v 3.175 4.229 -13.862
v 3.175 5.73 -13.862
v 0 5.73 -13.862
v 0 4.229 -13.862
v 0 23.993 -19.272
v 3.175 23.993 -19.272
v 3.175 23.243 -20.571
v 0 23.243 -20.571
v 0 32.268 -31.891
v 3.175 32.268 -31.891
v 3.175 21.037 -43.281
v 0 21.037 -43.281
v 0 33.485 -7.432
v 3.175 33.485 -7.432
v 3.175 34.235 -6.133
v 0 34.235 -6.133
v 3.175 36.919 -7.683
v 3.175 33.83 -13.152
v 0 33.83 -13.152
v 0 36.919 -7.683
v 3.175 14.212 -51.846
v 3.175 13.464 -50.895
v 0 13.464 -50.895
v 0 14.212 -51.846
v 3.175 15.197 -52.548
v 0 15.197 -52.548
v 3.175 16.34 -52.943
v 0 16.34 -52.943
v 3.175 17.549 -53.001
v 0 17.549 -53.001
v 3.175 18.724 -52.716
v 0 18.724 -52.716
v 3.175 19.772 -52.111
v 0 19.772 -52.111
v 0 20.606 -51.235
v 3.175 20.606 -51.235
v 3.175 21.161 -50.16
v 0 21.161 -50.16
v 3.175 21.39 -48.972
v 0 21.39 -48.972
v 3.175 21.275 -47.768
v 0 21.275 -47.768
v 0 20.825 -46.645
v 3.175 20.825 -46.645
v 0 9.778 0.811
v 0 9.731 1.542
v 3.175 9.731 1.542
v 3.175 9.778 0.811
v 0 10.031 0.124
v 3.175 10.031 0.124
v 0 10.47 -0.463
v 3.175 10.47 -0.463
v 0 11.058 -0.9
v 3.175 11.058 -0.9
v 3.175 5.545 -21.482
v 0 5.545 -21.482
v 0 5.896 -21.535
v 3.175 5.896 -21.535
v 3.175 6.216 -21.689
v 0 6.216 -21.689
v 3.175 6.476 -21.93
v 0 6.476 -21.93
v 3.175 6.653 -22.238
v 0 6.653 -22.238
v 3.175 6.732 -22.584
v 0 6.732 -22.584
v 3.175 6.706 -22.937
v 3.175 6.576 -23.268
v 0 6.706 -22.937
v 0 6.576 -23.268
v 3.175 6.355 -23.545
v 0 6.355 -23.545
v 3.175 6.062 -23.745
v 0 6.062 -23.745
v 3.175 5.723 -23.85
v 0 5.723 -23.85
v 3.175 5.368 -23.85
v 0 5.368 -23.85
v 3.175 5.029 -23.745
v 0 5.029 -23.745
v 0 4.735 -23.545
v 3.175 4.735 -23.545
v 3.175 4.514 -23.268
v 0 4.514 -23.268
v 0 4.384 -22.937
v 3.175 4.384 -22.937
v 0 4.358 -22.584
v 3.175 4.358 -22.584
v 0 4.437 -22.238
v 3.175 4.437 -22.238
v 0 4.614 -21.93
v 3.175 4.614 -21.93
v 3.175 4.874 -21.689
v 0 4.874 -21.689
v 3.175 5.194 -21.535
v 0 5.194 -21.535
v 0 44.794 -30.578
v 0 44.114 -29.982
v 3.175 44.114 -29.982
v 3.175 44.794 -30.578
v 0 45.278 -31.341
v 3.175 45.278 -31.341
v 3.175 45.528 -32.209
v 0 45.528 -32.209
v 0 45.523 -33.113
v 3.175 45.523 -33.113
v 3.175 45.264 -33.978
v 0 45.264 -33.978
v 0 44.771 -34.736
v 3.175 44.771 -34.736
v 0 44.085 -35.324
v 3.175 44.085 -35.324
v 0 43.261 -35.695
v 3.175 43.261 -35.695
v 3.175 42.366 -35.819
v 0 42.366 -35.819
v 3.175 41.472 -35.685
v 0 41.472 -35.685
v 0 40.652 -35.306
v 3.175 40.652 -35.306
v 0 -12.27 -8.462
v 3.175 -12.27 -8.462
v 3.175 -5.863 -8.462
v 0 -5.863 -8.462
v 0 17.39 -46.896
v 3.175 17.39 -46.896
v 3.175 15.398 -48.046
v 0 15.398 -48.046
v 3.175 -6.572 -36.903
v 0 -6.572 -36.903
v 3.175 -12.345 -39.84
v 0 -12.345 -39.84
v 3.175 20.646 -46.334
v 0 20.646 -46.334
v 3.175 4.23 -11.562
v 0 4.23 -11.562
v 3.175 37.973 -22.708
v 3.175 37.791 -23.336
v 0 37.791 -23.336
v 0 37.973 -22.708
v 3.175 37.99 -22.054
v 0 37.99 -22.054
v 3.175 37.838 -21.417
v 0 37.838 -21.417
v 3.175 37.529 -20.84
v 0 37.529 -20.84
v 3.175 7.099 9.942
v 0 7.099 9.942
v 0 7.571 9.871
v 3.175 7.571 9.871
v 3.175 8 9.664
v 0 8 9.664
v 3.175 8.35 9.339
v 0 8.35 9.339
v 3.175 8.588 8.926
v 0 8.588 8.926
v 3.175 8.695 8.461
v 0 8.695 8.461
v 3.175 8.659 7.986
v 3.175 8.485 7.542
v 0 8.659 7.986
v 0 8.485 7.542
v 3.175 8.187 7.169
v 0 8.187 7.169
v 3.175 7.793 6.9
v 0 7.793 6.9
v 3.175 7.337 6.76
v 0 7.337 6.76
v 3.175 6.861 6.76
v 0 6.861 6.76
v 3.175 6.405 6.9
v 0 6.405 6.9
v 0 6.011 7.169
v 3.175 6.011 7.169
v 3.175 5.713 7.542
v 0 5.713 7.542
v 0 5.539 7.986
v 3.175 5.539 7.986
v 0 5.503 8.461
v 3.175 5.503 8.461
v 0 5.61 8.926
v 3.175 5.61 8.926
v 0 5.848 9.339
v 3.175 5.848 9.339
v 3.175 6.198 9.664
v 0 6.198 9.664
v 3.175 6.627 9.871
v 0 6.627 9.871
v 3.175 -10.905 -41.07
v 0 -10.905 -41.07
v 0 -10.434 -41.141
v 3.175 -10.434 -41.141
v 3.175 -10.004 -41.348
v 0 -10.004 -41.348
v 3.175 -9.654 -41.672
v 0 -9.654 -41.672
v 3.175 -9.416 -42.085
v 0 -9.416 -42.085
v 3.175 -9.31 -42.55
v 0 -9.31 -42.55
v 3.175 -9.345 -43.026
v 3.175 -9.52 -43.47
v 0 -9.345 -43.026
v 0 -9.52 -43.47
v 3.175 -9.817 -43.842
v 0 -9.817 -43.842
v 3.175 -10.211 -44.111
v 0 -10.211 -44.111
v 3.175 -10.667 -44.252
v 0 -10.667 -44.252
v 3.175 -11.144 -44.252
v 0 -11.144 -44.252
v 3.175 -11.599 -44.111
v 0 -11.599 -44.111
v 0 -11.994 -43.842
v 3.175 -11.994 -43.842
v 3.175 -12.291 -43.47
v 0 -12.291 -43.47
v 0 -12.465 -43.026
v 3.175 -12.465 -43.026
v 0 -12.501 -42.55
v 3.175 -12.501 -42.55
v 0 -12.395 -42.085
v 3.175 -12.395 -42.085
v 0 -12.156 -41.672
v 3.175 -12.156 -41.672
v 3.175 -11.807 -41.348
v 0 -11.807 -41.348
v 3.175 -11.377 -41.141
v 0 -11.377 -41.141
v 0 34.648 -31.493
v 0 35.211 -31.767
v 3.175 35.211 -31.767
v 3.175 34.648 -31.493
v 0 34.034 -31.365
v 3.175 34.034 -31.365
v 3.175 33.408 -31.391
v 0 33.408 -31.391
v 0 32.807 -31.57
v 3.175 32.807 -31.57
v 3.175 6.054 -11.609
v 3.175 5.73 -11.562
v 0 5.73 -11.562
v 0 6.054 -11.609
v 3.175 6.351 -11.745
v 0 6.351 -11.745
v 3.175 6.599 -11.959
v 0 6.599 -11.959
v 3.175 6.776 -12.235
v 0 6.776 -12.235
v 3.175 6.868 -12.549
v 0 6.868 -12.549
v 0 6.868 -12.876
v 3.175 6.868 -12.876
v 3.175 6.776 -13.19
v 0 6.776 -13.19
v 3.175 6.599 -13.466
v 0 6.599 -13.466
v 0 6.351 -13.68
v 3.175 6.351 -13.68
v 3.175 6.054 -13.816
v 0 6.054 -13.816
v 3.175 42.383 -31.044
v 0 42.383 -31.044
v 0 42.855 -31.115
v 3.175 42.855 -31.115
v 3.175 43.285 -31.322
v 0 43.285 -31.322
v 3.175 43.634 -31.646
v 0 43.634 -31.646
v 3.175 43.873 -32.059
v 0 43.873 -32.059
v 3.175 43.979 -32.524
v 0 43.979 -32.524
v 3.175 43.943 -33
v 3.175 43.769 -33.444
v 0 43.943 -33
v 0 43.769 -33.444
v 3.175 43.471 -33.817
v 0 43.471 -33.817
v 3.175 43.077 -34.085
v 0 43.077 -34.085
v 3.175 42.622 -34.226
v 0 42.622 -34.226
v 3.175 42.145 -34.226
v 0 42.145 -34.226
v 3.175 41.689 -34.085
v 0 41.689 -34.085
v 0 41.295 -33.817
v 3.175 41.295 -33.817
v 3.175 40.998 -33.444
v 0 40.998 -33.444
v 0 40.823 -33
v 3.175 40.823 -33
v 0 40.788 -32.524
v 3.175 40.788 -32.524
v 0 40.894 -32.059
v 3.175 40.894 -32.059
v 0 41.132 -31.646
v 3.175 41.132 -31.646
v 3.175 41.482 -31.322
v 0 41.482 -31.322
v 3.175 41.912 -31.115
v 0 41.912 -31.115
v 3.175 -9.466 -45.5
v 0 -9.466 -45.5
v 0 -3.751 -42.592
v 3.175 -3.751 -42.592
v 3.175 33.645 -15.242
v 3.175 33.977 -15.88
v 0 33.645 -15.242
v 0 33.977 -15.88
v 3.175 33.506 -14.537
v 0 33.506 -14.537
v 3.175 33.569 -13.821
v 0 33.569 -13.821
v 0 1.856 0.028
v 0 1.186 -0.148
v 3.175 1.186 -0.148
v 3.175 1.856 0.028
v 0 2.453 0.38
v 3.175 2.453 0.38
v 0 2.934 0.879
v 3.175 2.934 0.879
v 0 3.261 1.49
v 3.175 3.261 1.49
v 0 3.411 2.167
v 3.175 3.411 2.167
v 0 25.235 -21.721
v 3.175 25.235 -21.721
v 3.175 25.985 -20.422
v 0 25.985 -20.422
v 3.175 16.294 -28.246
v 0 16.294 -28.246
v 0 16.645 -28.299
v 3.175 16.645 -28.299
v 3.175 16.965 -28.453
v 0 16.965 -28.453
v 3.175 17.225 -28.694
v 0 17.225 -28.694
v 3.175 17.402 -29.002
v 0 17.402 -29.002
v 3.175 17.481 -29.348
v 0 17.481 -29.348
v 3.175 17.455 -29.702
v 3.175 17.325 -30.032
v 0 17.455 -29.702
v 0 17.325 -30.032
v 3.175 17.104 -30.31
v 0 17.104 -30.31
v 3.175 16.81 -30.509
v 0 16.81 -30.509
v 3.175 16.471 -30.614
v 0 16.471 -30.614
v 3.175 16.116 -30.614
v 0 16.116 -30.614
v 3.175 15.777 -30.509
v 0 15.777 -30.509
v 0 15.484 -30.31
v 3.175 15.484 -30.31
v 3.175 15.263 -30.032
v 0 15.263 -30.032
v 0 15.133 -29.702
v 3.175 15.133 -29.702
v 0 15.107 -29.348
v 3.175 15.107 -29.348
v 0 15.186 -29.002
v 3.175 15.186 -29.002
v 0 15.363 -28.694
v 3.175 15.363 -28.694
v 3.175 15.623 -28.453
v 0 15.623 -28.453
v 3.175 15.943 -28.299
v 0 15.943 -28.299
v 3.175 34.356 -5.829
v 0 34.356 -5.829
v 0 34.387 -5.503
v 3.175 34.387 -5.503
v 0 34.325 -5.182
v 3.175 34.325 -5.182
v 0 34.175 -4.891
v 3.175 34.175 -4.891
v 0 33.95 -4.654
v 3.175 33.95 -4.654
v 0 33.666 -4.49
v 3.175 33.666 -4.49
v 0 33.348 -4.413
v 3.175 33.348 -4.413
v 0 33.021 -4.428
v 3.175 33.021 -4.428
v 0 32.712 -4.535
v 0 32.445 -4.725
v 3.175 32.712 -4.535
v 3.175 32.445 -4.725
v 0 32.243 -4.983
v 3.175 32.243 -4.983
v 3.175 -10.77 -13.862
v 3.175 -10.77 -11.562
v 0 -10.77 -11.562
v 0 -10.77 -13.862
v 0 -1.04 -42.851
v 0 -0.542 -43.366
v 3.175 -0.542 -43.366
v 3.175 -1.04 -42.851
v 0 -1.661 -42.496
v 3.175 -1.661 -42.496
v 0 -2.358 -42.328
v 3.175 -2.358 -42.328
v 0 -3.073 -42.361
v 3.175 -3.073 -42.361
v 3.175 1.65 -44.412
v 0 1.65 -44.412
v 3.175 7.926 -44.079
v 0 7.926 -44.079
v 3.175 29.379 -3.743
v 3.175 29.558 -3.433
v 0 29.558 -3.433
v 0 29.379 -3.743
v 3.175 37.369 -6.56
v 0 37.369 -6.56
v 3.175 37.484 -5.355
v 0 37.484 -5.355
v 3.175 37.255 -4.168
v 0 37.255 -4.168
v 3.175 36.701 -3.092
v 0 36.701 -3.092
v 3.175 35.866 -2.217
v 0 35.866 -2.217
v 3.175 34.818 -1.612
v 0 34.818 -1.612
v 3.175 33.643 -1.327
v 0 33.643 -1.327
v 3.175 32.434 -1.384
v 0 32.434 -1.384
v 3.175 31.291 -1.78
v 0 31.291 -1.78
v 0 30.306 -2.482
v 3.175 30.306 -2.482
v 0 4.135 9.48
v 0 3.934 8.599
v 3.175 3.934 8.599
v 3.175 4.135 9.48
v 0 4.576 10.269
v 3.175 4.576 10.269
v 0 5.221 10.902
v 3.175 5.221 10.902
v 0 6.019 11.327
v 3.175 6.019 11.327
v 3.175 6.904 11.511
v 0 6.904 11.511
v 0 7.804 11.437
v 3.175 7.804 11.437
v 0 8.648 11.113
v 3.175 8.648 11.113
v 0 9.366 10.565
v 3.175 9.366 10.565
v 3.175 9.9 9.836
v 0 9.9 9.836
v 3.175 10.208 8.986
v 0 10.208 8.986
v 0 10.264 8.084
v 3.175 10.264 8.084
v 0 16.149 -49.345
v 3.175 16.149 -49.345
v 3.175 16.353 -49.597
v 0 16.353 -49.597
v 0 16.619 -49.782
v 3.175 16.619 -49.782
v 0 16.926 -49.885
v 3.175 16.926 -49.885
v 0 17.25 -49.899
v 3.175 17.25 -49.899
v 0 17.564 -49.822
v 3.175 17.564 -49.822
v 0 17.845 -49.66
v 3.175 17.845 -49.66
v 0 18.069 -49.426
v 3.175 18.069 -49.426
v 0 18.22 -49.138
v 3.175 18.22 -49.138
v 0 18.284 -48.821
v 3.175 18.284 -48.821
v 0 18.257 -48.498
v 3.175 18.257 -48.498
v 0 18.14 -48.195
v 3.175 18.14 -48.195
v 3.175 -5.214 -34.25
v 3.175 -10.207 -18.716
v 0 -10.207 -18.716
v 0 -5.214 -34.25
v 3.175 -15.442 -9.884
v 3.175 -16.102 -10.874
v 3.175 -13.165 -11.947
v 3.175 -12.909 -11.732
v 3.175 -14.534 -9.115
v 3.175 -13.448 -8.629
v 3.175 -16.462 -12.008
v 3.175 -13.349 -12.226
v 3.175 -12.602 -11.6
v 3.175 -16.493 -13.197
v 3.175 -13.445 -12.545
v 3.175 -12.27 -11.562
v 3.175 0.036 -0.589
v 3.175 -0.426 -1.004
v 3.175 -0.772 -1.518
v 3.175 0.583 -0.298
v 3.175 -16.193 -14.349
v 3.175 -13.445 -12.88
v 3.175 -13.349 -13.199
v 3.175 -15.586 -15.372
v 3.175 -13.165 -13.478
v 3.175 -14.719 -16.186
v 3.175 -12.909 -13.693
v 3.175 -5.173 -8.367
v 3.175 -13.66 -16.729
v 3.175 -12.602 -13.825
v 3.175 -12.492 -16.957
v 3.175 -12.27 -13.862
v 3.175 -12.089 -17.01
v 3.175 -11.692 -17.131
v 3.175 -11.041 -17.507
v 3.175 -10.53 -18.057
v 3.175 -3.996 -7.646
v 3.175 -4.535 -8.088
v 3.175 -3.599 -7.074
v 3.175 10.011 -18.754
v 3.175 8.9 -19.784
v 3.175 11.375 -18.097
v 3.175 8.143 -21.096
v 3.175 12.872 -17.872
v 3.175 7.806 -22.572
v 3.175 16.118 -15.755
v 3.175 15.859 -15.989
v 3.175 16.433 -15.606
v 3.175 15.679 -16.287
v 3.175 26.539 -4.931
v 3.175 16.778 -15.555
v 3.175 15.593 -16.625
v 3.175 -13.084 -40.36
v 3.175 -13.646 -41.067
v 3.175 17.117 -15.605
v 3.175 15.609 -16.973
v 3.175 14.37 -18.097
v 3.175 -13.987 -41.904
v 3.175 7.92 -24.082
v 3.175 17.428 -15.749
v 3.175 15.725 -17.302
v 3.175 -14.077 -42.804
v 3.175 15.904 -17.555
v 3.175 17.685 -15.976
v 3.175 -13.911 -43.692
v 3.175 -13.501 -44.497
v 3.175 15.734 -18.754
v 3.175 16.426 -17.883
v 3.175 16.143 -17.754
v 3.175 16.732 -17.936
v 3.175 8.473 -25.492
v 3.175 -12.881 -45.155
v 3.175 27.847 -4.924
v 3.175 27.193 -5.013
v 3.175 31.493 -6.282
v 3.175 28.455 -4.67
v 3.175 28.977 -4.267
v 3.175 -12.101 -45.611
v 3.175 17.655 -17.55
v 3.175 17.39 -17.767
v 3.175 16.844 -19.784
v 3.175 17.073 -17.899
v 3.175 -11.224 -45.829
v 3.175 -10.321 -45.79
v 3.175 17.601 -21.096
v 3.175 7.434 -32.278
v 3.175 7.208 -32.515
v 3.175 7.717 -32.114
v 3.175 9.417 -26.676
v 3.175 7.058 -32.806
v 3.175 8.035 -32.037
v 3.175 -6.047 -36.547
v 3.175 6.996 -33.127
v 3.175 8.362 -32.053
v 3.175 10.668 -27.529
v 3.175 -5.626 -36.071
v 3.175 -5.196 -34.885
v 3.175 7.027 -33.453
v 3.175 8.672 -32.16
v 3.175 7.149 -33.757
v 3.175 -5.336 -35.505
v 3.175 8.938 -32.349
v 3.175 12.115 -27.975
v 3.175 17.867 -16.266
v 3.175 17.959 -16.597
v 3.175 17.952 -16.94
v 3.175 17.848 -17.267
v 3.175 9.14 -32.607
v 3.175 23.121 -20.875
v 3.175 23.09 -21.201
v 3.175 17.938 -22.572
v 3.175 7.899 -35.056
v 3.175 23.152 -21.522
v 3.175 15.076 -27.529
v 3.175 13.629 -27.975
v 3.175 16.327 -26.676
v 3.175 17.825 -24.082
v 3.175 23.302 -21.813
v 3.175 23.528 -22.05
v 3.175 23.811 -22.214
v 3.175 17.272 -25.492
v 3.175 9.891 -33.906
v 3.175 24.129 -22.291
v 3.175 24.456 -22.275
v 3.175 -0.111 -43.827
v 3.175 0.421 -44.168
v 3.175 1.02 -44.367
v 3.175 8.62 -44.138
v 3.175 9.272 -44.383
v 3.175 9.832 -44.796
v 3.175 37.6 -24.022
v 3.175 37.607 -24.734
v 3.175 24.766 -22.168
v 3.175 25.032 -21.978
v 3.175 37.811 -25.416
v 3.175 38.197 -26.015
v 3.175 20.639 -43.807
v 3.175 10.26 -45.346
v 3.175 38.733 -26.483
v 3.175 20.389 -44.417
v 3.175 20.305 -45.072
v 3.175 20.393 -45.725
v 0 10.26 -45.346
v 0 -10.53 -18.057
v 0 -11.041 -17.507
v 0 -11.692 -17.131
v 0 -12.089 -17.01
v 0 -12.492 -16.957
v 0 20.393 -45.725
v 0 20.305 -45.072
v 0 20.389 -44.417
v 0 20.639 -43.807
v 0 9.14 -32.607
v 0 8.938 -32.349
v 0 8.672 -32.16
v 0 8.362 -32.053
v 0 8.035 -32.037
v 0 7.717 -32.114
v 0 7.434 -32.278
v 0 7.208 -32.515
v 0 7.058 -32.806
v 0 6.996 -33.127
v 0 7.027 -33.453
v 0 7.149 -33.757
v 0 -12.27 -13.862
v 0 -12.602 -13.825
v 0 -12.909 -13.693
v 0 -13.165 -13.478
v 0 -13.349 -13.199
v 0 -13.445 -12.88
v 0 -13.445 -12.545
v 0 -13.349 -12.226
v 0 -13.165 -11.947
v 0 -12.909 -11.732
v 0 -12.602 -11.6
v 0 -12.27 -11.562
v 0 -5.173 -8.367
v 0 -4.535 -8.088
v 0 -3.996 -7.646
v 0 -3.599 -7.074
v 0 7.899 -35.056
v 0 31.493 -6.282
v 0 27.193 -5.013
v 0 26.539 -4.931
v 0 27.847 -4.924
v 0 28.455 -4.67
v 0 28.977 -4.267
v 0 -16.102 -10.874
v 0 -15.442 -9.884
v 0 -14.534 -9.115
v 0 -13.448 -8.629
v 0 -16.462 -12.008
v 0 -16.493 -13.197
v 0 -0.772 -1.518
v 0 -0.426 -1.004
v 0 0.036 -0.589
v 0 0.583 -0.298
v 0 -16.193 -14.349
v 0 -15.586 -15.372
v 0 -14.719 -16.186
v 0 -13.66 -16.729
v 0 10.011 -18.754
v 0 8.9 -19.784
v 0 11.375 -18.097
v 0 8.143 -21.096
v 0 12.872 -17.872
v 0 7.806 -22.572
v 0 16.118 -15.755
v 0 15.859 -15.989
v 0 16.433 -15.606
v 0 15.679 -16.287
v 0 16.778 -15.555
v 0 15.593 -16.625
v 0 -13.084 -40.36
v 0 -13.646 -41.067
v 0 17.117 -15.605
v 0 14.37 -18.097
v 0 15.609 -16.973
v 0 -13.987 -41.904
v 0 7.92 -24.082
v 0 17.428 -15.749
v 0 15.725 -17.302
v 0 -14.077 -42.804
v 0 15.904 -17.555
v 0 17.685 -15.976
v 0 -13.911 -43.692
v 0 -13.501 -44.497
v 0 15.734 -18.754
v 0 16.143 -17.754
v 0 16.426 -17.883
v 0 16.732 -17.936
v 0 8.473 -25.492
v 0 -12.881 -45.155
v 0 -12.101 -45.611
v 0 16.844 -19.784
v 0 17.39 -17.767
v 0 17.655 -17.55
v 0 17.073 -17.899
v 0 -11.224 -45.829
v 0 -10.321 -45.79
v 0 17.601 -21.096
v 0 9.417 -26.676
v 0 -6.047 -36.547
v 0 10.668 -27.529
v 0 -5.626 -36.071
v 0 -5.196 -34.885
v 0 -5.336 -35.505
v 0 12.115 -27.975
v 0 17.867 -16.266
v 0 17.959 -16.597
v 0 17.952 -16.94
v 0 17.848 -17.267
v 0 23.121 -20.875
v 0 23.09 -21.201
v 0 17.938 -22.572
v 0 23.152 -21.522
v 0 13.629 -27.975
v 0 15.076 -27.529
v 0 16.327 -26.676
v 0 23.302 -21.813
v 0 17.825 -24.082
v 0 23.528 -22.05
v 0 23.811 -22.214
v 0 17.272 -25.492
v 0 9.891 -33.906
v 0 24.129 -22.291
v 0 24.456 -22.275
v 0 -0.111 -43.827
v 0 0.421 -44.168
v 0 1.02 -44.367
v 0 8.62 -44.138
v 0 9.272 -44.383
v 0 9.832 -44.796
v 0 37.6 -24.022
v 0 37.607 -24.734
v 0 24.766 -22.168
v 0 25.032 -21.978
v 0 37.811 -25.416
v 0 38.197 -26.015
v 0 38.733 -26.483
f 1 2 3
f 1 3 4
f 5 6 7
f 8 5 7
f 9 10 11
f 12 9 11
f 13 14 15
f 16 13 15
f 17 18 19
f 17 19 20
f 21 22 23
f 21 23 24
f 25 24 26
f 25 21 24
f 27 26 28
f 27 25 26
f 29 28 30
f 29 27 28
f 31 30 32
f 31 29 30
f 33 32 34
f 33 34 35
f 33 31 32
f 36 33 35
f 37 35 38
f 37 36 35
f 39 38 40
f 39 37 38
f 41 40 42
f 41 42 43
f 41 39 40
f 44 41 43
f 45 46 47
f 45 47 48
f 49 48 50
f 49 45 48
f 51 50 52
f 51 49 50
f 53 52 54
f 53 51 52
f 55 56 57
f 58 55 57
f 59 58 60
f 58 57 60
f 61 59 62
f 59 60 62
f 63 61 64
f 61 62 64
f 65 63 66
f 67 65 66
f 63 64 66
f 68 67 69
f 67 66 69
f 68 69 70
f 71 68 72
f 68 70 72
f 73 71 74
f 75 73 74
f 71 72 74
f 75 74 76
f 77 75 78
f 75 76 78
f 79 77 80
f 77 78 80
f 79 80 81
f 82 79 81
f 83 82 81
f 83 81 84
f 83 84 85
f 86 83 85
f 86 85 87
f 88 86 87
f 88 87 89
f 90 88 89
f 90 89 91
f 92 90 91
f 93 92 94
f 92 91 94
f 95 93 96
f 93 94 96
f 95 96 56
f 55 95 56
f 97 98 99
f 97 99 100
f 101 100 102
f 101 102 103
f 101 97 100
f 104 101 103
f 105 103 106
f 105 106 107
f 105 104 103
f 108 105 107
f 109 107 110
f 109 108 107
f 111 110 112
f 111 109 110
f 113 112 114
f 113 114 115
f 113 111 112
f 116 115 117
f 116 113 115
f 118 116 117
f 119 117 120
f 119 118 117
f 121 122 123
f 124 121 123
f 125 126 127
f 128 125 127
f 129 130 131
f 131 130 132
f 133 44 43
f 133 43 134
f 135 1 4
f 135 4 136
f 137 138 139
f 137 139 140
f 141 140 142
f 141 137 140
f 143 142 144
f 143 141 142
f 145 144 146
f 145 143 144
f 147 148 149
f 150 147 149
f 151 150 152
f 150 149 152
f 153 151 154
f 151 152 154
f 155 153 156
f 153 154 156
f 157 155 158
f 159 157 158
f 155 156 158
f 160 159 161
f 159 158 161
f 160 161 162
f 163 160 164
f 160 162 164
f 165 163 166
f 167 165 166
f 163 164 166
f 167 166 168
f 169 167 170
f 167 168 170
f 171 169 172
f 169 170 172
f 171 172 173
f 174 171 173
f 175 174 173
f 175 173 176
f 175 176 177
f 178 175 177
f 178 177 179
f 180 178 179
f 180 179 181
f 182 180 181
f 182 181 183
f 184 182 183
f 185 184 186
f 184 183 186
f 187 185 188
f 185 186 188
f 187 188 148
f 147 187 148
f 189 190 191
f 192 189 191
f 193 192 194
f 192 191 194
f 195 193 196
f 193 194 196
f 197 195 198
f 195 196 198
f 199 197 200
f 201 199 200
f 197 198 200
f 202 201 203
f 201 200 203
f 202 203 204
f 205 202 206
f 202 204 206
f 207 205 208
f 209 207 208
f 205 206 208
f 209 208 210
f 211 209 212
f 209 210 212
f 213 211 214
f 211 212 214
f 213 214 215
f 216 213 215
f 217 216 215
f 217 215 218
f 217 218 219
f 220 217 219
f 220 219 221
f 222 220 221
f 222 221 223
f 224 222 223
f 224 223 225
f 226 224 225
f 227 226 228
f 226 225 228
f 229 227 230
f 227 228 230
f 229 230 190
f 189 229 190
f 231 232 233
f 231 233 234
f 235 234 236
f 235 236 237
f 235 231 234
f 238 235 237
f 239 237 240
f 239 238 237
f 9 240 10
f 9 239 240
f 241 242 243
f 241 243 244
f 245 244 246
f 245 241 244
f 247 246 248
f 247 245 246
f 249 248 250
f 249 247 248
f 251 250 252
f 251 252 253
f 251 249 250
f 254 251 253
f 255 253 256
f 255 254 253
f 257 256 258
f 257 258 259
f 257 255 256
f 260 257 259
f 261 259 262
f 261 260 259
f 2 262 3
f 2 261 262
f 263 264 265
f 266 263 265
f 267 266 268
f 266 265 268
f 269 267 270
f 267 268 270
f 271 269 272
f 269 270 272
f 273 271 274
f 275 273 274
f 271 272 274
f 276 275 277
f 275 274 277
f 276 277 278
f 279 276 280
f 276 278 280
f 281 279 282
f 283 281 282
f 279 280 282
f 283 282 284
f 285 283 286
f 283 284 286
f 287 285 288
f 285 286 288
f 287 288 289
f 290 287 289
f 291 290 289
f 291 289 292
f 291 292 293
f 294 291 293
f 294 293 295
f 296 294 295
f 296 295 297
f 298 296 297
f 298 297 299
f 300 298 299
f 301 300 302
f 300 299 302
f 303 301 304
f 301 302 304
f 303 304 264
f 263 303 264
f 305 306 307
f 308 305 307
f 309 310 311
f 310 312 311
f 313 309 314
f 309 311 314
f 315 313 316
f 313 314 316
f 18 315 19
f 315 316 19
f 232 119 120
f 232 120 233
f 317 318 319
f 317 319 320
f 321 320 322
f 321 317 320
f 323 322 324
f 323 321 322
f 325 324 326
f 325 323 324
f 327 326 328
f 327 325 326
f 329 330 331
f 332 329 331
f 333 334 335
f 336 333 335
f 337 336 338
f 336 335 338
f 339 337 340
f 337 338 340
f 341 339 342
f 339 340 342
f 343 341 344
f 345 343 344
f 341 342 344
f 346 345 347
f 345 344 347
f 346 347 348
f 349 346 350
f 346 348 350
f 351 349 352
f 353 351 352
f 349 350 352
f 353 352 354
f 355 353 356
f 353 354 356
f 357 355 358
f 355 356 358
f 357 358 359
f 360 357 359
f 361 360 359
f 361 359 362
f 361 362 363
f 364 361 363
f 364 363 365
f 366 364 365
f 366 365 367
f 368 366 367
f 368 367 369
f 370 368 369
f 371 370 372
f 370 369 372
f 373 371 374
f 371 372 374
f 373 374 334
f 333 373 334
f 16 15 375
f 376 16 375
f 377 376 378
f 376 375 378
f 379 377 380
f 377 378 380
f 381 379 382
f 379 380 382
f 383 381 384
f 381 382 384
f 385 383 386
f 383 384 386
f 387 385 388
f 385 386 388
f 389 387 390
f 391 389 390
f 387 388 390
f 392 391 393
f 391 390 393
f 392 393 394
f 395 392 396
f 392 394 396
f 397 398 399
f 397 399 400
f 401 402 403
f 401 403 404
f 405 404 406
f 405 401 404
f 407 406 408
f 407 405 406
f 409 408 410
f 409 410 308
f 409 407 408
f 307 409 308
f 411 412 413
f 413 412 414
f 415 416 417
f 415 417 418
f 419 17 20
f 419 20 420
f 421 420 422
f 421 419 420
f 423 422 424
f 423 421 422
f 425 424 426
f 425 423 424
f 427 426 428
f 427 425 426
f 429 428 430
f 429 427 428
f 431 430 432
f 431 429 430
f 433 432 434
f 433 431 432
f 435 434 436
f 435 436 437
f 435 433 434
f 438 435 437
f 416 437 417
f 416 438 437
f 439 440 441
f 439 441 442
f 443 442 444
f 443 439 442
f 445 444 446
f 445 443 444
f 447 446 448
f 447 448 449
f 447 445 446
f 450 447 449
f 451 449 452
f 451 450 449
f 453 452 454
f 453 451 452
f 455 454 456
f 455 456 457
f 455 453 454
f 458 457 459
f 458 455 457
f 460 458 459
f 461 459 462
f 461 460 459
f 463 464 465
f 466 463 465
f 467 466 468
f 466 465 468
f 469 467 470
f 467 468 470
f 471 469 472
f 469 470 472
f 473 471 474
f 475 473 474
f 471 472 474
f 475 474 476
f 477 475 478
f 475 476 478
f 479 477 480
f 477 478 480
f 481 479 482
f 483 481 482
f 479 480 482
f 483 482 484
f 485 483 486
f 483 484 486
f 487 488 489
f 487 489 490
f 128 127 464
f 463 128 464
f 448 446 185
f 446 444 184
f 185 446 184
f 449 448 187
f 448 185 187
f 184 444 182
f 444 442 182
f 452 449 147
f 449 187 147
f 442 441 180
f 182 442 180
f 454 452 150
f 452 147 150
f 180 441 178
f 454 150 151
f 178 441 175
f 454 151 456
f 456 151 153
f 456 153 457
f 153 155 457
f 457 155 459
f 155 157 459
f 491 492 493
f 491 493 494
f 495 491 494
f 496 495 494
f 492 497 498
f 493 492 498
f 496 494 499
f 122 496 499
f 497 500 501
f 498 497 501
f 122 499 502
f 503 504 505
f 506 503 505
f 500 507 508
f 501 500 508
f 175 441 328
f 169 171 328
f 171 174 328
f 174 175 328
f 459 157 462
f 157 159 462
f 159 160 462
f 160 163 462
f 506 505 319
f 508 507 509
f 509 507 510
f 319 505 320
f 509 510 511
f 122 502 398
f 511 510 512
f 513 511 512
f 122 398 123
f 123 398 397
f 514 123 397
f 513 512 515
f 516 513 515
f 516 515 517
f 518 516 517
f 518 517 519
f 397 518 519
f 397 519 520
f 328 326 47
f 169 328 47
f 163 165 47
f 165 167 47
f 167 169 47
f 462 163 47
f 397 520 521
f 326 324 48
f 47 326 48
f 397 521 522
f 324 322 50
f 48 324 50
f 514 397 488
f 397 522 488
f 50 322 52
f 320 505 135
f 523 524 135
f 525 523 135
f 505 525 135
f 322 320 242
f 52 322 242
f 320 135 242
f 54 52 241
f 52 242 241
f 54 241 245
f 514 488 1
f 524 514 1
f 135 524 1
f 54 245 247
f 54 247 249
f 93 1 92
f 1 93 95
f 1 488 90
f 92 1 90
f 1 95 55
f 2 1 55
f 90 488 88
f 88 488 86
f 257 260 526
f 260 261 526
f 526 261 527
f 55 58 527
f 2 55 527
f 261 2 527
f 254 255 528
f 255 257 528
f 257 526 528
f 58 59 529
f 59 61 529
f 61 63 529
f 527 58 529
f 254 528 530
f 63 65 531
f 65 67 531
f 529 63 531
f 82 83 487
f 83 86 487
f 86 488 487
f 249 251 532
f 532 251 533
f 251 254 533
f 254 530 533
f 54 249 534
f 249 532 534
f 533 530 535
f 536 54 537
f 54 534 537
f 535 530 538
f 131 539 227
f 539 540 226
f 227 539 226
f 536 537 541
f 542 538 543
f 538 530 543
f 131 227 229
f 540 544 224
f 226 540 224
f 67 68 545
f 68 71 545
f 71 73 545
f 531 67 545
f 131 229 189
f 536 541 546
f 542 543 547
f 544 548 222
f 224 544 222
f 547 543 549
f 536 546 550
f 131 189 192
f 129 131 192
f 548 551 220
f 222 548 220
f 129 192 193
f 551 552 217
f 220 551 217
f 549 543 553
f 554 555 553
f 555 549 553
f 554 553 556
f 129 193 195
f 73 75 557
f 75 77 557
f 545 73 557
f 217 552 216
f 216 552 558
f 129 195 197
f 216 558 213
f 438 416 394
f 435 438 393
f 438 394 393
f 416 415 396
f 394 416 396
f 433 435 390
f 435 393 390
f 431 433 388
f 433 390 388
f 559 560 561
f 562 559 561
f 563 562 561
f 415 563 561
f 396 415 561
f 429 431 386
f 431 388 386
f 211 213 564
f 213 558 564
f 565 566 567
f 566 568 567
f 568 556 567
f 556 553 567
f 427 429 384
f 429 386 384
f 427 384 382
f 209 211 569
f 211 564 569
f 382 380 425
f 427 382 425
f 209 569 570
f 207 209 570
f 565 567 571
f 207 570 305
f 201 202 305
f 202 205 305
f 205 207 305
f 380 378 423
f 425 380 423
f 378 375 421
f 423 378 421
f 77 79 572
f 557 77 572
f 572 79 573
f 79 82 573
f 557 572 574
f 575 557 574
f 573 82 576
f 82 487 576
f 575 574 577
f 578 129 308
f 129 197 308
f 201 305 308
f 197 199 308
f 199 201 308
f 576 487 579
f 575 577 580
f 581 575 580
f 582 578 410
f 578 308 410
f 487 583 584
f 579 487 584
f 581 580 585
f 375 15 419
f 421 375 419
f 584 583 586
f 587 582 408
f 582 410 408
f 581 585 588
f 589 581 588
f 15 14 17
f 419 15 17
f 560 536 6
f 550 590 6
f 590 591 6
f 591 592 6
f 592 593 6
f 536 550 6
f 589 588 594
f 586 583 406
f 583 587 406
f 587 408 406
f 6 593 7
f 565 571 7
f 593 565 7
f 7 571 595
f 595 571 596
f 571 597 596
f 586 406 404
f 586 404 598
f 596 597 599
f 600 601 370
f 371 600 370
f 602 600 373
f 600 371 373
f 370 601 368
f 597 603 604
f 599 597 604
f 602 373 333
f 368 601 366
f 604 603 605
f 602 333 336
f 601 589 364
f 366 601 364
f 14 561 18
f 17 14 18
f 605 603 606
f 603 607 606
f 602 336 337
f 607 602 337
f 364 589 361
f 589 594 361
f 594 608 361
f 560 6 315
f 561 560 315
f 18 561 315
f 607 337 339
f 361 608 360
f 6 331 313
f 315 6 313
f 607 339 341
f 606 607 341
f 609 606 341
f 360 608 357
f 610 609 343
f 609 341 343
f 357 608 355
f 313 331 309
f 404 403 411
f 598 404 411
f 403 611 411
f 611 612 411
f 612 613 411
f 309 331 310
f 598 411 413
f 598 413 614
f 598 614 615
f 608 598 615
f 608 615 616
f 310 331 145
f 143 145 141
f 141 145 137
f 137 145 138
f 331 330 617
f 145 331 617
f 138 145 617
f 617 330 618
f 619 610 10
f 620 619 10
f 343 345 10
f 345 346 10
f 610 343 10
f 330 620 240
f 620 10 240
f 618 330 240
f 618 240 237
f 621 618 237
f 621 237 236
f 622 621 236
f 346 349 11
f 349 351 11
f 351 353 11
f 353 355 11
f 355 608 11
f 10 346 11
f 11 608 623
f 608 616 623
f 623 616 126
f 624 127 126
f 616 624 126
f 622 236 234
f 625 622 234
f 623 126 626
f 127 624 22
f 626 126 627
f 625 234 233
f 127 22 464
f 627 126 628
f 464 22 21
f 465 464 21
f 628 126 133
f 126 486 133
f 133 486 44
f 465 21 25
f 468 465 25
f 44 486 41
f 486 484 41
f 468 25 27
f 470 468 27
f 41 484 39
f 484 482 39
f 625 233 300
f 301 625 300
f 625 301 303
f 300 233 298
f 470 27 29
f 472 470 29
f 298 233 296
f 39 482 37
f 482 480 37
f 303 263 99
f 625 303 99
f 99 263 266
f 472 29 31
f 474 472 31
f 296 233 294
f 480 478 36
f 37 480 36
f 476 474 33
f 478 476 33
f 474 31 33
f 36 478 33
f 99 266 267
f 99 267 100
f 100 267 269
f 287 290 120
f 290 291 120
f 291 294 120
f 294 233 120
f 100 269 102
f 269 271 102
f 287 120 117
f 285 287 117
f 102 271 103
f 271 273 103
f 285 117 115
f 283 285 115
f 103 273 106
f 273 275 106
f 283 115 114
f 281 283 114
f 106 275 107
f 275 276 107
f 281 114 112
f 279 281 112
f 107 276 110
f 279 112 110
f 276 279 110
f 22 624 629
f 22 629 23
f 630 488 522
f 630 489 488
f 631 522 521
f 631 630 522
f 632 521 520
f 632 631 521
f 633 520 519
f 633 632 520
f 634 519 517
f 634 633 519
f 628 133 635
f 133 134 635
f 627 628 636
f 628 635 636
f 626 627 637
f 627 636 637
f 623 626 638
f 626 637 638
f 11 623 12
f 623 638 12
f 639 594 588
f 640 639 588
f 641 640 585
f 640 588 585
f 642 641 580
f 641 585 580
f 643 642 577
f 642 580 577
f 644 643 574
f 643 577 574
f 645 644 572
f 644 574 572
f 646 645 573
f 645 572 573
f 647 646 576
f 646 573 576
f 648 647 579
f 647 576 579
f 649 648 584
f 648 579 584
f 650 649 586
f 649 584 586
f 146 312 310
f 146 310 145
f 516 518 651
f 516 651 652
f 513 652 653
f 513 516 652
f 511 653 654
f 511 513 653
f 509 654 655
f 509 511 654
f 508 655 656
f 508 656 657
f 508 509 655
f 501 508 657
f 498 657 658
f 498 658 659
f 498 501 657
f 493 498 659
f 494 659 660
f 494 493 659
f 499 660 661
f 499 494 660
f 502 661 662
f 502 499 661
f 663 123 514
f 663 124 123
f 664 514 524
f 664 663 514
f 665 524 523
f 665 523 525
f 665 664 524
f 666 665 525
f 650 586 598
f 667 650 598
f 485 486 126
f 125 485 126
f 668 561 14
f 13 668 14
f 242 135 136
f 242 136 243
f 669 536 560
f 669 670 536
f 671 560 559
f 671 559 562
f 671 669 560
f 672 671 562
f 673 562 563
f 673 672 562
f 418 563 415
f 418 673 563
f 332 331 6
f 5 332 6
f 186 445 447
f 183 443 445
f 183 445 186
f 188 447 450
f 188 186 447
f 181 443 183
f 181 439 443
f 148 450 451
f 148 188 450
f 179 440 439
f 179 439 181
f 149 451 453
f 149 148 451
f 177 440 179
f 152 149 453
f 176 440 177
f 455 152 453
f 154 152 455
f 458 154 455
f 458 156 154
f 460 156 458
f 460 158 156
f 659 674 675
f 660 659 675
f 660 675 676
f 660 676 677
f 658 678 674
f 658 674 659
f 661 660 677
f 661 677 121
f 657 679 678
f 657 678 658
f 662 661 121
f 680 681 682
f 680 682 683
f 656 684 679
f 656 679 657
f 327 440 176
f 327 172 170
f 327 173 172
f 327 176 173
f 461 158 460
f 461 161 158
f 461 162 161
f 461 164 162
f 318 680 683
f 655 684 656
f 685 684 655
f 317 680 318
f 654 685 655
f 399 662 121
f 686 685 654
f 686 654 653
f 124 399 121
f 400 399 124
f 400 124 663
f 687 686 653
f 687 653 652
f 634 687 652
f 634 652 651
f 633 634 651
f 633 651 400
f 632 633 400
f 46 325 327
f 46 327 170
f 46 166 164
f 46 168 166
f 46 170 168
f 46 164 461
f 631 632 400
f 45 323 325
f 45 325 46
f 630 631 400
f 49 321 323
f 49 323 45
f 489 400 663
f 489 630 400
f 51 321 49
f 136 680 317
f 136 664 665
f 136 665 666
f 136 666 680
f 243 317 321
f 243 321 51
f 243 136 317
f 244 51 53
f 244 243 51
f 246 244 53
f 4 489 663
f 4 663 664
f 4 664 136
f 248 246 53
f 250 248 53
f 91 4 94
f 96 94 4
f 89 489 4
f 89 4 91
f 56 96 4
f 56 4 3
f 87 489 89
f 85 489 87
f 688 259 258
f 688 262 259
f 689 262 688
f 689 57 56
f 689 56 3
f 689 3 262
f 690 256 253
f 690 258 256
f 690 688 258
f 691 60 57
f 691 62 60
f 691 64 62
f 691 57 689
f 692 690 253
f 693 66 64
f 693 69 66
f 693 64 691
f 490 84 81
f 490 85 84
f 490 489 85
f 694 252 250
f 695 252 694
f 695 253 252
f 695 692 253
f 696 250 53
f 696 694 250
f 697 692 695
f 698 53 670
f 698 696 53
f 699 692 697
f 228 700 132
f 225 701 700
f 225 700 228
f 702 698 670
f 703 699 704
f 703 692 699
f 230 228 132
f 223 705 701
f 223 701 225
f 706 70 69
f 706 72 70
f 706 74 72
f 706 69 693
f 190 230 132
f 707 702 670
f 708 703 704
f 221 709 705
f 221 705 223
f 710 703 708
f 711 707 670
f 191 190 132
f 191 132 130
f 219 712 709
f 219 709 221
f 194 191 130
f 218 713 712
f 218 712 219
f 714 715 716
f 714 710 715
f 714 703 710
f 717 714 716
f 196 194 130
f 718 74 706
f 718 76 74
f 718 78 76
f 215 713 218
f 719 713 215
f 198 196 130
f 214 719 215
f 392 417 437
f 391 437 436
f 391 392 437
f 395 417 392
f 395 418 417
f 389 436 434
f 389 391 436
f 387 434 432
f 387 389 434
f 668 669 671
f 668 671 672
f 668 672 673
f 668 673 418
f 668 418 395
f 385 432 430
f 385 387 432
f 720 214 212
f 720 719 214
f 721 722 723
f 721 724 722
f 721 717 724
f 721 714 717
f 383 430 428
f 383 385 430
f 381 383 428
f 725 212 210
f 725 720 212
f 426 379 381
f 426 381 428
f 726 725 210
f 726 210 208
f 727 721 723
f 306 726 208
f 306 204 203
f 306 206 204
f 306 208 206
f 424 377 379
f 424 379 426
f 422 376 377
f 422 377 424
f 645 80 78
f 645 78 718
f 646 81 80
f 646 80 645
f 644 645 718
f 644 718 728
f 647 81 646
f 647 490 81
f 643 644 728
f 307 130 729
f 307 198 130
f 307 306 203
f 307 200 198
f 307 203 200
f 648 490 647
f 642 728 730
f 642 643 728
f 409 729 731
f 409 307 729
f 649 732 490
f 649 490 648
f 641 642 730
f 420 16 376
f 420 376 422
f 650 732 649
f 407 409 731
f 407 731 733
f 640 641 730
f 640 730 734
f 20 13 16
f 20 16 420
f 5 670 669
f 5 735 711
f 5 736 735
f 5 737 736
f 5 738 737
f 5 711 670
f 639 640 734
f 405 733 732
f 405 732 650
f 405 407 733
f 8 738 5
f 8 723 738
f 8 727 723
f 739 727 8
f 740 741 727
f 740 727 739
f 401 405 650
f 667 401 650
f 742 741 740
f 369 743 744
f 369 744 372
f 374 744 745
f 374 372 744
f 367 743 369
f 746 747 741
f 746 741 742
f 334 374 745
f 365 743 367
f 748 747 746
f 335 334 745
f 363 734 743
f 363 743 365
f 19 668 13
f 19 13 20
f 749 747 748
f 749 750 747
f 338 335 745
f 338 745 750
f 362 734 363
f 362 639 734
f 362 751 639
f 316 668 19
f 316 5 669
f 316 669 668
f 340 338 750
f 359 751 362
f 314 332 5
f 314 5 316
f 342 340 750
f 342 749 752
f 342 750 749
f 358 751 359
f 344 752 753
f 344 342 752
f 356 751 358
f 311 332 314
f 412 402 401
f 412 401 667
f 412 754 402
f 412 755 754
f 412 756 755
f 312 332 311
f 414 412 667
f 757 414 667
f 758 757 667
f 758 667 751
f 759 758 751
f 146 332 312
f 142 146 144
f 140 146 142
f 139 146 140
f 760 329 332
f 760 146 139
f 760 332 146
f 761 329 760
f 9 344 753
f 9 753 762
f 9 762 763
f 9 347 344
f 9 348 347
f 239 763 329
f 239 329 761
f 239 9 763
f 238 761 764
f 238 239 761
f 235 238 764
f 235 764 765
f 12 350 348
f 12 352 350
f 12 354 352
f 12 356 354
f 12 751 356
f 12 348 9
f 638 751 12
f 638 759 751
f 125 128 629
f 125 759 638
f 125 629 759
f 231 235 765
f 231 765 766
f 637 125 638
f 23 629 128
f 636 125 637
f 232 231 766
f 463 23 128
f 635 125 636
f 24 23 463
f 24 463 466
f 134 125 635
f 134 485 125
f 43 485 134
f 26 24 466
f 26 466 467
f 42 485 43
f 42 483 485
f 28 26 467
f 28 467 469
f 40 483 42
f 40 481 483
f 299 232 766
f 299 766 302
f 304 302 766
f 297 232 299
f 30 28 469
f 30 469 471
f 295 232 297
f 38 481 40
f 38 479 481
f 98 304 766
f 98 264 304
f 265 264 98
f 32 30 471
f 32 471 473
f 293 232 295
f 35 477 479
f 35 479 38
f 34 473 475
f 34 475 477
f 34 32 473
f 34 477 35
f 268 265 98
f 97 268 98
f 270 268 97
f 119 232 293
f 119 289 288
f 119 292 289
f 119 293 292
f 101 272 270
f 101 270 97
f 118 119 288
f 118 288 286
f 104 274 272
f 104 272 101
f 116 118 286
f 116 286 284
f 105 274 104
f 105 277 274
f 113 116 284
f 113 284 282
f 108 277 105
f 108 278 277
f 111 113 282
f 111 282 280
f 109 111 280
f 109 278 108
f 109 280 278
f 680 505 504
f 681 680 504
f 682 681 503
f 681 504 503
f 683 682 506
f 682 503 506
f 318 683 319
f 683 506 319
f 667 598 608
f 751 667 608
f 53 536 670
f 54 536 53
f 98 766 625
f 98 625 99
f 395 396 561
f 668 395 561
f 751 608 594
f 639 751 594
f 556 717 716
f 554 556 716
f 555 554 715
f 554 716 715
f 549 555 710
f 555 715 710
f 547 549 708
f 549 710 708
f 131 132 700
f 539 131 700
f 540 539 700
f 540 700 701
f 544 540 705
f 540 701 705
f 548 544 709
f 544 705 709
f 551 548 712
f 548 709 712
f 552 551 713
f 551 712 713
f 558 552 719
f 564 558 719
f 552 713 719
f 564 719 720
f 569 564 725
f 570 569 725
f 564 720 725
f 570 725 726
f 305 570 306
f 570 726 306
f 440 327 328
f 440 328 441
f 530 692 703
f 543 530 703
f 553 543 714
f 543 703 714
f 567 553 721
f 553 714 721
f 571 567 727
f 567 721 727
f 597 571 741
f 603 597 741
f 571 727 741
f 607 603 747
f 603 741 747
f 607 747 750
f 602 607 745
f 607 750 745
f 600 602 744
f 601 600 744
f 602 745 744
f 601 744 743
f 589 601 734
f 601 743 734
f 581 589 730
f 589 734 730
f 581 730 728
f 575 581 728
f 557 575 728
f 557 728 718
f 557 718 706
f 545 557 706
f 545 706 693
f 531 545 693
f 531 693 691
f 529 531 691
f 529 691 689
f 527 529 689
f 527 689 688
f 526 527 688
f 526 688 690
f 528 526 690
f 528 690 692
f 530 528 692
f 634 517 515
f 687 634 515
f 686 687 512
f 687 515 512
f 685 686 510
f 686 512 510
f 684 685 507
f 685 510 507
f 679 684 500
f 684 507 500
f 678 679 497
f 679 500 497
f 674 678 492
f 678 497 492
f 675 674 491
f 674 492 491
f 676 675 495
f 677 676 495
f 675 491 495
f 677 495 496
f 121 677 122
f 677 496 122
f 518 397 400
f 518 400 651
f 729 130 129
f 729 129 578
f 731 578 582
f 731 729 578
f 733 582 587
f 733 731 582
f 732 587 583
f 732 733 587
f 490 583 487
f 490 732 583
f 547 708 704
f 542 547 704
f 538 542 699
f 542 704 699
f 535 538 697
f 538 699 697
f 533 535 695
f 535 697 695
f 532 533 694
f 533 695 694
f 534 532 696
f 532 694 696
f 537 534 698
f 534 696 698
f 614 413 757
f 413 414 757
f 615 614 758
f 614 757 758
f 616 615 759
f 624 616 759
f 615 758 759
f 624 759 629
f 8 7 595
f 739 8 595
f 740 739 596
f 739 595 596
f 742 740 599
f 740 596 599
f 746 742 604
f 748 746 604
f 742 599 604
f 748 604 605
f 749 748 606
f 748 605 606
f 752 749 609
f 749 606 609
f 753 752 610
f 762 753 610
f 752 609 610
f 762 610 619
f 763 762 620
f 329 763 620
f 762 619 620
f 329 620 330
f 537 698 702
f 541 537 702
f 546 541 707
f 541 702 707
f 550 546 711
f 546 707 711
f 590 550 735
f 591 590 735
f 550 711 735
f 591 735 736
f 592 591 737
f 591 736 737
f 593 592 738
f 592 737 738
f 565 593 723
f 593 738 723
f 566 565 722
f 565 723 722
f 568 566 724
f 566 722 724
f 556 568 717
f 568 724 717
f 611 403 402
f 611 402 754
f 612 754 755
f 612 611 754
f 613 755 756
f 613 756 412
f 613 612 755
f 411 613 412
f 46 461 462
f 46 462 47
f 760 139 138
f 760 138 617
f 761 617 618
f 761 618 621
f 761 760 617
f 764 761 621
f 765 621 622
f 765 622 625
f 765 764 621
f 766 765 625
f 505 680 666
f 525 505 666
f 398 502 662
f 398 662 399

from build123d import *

# Parameters (mm, degrees)
BOSS_EXTRUDE1_DEPTH = 3.175
SKETCH8_W           = 24
SKETCH8_H           = 4.7625
BOSS_EXTRUDE2_DEPTH = 3.175
BOSS_EXTRUDE3_DEPTH = 3.175
CUT_EXTRUDE8_DEPTH  = 3.175
CUT_EXTRUDE7_DEPTH  = 3.175
FILLET1_R           = 2.54
FILLET2_R           = 2.54
SKETCH13_R          = 1.190625
CUT_EXTRUDE9_DEPTH  = 3.175
SKETCH17_R          = 1.6
BOSS_EXTRUDE5_DEPTH = 3.175
FILLET4_R           = 2.54
SKETCH20_R          = 5.08
CUT_EXTRUDE12_DEPTH = 70.976978338


with BuildPart() as part:
    # Sketch1 → Boss-Extrude1 (new body)
    with BuildSketch(Plane(origin=(0, 0, 0), x_dir=(0, 0, -1), z_dir=(1, 0, 0))):
        Polygon((43.890597967, 11.483842091), (31.890597967, 32.268451781), (22.25, 38.538130468), (44.5, 0), align=None)
        Polygon((22.25, 38.538130468), (44.5, 0), (0, 0), align=None)
        Polygon((0.899789316, 11.058480811), (12.899789316, 31.843090502), (22.25, 38.538130468), (0, 0), align=None)
        Polygon((10.25, -5.214163404), (34.25, -5.214163404), (44.5, 0), (0, 0), align=None)
    extrude(amount=BOSS_EXTRUDE1_DEPTH)

    # Sketch8 → Boss-Extrude2 (add)
    with BuildSketch(Plane.ZY):
        Polygon((-43.890597967, 11.483842091), (-31.890597967, 32.268451781), (-36.015043953, 34.649701781), (-48.015043953, 13.865092091), align=None)
        with Locations((-22.25, -7.595413404)):
            Rectangle(SKETCH8_W, SKETCH8_H)
        Polygon((-12.899789316, 31.843090502), (-0.899789316, 11.058480811), (3.22465667, 13.439730811), (-8.77534333, 34.224340502), align=None)
    extrude(amount=-BOSS_EXTRUDE2_DEPTH)

    # Sketch9 → Boss-Extrude3 (add)
    # profile 1 of 3: a face of its own
    with BuildSketch(Plane(origin=(3.175, 0, 0), x_dir=(0, 0, -1), z_dir=(1, 0, 0))):
        with BuildLine():
            Line((3.432653779, 29.558030749), (5.419099548, 28.411155749))
            Line((5.419099548, 28.411155749), (8.77534333, 34.224340502))
            Line((8.77534333, 34.224340502), (12.899789316, 31.843090502))
            Line((12.899789316, 31.843090502), (14.562601584, 33.033715502))
            Line((14.562601584, 33.033715502), (7.682653779, 36.919246681))
            ThreePointArc((7.682653779, 36.919246681), (1.877045812, 35.363638715), (3.432653779, 29.558030749))
        make_face()
        with BuildLine():
            Line((4.98264756, 32.24269873), (6.281769095, 31.492650563))
            Line((6.281769095, 31.492650563), (7.43173356, 33.484529507))
            Line((7.43173356, 33.484529507), (6.13264756, 34.234557159))
            ThreePointArc((6.13264756, 34.234557159), (4.561718346, 33.813627945), (4.98264756, 32.24269873))
        make_face(mode=Mode.SUBTRACT)
    # profile 2 of 3: a face of its own
    with BuildSketch(Plane(origin=(3.175, 0, 0), x_dir=(0, 0, -1), z_dir=(1, 0, 0))):
        with BuildLine():
            Line((8.462487563, -12.270413404), (8.462487563, -4.304857849))
            Line((8.462487563, -4.304857849), (10.25, -5.214163404))
            Line((10.25, -5.214163404), (10.25, -9.976663404))
            Line((10.25, -9.976663404), (20.606380555, -9.976663404))
            Line((20.606380555, -9.976663404), (20.606380555, -10.770413404))
            Line((20.606380555, -10.770413404), (16.962487563, -10.770413404))
            Line((16.962487563, -10.770413404), (16.962487563, -12.270413404))
            ThreePointArc((16.962487563, -12.270413404), (12.712487563, -16.520413404), (8.462487563, -12.270413404))
        make_face()
        with BuildLine():
            Line((11.5625, -12.270413404), (11.5625, -10.7703581))
            Line((11.5625, -10.7703581), (13.8625, -10.770317068))
            Line((13.8625, -10.770317068), (13.8625, -12.270413404))
            ThreePointArc((13.8625, -12.270413404), (12.7125, -13.457465158), (11.5625, -12.270413404))
        make_face(mode=Mode.SUBTRACT)
    # profile 3 of 3: a face of its own
    with BuildSketch(Plane(origin=(3.175, 0, 0), x_dir=(0, 0, -1), z_dir=(1, 0, 0))):
        with BuildLine():
            Line((46.645245941, 20.825151843), (44.658800171, 19.678276843))
            Line((44.658800171, 19.678276843), (48.015043953, 13.865092091))
            Line((48.015043953, 13.865092091), (43.890597967, 11.483842091))
            Line((43.890597967, 11.483842091), (43.996871736, 9.481172067))
            Line((43.996871736, 9.481172067), (50.895245941, 13.463935911))
            ThreePointArc((50.895245941, 13.463935911), (52.450853907, 19.269543877), (46.645245941, 20.825151843))
        make_face()
        with BuildLine():
            Line((48.195239723, 18.140483862), (46.896118188, 17.390435694))
            Line((46.896118188, 17.390435694), (48.046153723, 15.398212801))
            Line((48.046153723, 15.398212801), (49.345239723, 16.148625433))
            ThreePointArc((49.345239723, 16.148625433), (49.750491106, 17.710503048), (48.195239723, 18.140483862))
        make_face(mode=Mode.SUBTRACT)
    extrude(amount=-BOSS_EXTRUDE3_DEPTH)

    # Sketch12 → Cut-Extrude8 (cut)
    with BuildSketch(Plane(origin=(3.175, 0, 0), x_dir=(0, 0, -1), z_dir=(1, 0, 0))):
        with BuildLine():
            Line((33.756782454, 7.148625433), (35.055868454, 7.898653085))
            Line((35.055868454, 7.898653085), (33.905903989, 9.89053203))
            Line((33.905903989, 9.89053203), (32.606782454, 9.140483862))
            ThreePointArc((32.606782454, 9.140483862), (32.18585324, 7.569554647), (33.756782454, 7.148625433))
        make_face()
        with BuildLine():
            Line((21.721104828, 25.234557159), (20.422018828, 25.984584811))
            Line((20.422018828, 25.984584811), (19.271959255, 23.992760775))
            Line((19.271959255, 23.992760775), (20.571104828, 23.24269873))
            ThreePointArc((20.571104828, 23.24269873), (22.142034043, 23.663627945), (21.721104828, 25.234557159))
        make_face()
        with BuildLine():
            Line((13.8625, 5.729586596), (13.8625, 4.229490261))
            Line((13.8625, 4.229490261), (11.5625, 4.229531293))
            Line((11.5625, 4.229531293), (11.5625, 5.729586596))
            ThreePointArc((11.5625, 5.729586596), (12.7125, 6.879586596), (13.8625, 5.729586596))
        make_face()
    extrude(amount=-CUT_EXTRUDE8_DEPTH, mode=Mode.SUBTRACT)

    # Sketch10 → Cut-Extrude7 (cut)
    with BuildSketch(Plane(origin=(3.175, 0, 0), x_dir=(0, 0, -1), z_dir=(1, 0, 0))):
        Polygon((31.890597967, 32.268451781), (44.658800171, 19.678276843), (36.015043953, 34.649701781), align=None)
        Polygon((5.419099548, 28.411155749), (0.899789316, 11.058480811), (-3.22465667, 13.439730811), align=None)
        Polygon((16.962487563, -10.770413404), (34.25, -5.214163404), (34.25, -11.414104667), align=None)
    extrude(amount=-CUT_EXTRUDE7_DEPTH, mode=Mode.SUBTRACT)

    # Fillet1
    fillet1_edges = [part.edges().sort_by_distance(p)[0] for p in [
        (1.5875, -10.770413404, -16.962487563),
    ]]
    fillet(fillet1_edges, radius=FILLET1_R)

    # Fillet2
    fillet2_edges = [part.edges().sort_by_distance(p)[0] for p in [
        (1.5875, -4.304857849, -8.462487563),
        (1.5875, 0, -44.5),
        (1.5875, 0, 0),
        (1.5875, 38.538130468, -22.25),
        (1.5875, 33.033715502, -14.562601584),
        (1.5875, 28.411155749, -5.419099548),
        (1.5875, 19.678276843, -44.658800171),
        (1.5875, 9.481172067, -43.996871736),
    ]]
    fillet(fillet2_edges, radius=FILLET2_R)

    # Sketch13 → Cut-Extrude9 (cut)
    with BuildSketch(Plane.ZY):
        with BuildLine():
            ThreePointArc((-15.555361616, 16.777538207), (-16.768661404, 17.967947273), (-17.935747959, 16.732196856))
            Line((-17.935747959, 16.732196856), (-16.745986616, 16.777538207))
            Line((-16.745986616, 16.777538207), (-17.301600526, 15.724503984))
            ThreePointArc((-17.301600526, 15.724503984), (-16.131145141, 15.757951109), (-15.555361616, 16.777538207))
        make_face()
        with BuildLine():
            Line((-16.745986616, 16.777538207), (-17.935747959, 16.732196856))
            ThreePointArc((-17.935747959, 16.732196856), (-17.753679488, 16.143390774), (-17.301600526, 15.724503984))
            Line((-17.301600526, 15.724503984), (-16.745986616, 16.777538207))
        make_face()
        with Locations((-22.672534986, 5.545173165)):
            Circle(SKETCH13_R)
        with Locations((-29.436774271, 16.293897131)):
            Circle(SKETCH13_R)
    extrude(amount=-CUT_EXTRUDE9_DEPTH, mode=Mode.SUBTRACT)

    # Sketch17 → Boss-Extrude5 (add)
    # profile 1 of 3: a face of its own
    with BuildSketch(Plane.ZY):
        with BuildLine():
            Line((-35.808950658, -4.421126968), (-39.839725672, -12.34482262))
            ThreePointArc((-39.839725672, -12.34482262), (-44.109179481, -13.735151419), (-45.499508281, -9.46569761))
            Line((-45.499508281, -9.46569761), (-41.468733267, -1.542001958))
            Line((-41.468733267, -1.542001958), (-35.808950658, -4.421126968))
        make_face()
        with Locations((-42.669616976, -10.905260115)):
            Circle(SKETCH17_R, mode=Mode.SUBTRACT)
    # profile 2 of 3: a face of its own
    with BuildSketch(Plane.ZY):
        with BuildLine():
            Line((-0.261472593, 3.213518539), (8.599244609, 3.934483634))
            ThreePointArc((8.599244609, 3.934483634), (11.506298933, 7.356513026), (8.084269542, 10.26356735))
            Line((8.084269542, 10.26356735), (-0.77644766, 9.542602255))
            Line((-0.77644766, 9.542602255), (-0.261472593, 3.213518539))
        make_face()
        with Locations((8.341757075, 7.099025492)):
            Circle(SKETCH17_R, mode=Mode.SUBTRACT)
    # profile 3 of 3: a face of its own
    with BuildSketch(Plane.ZY):
        with BuildLine():
            Line((-25.13548002, 36.661583739), (-29.98221424, 44.114185124))
            ThreePointArc((-29.98221424, 44.114185124), (-34.374834099, 45.044851969), (-35.305500944, 40.65223211))
            Line((-35.305500944, 40.65223211), (-30.458766724, 33.199630725))
            Line((-30.458766724, 33.199630725), (-25.13548002, 36.661583739))
        make_face()
        with Locations((-32.643857592, 42.383208617)):
            Circle(SKETCH17_R, mode=Mode.SUBTRACT)
    extrude(amount=-BOSS_EXTRUDE5_DEPTH)

    # Fillet4
    # the kernel refuses this fillet: 2.54 mm, written as the material it adds along each edge
    with BuildSketch(Plane(origin=(0, 36.661583739, -25.13548002), x_dir=(0, 0.5315830218036889, 0.8470061929703104), z_dir=(1, 0, 0))) as fillet4_piece_1:
        with BuildLine():
            CenterArc((2.499765737, -2.512091747), FILLET4_R, 98.501304121, 80.573560632)
            Line((-0.039903163, -2.471081023), (-0.293870053, -2.46697995))
            Line((-0.293870053, -2.46697995), (-0.25396689, 0.004101072))
            Line((-0.25396689, 0.004101072), (0.004101072, 0.25396689))
            ThreePointArc((0.004101072, 0.25396689), (1.711869919, 0.226389737), (2.086723346, 0.251209175))
            Line((2.086723346, 0.251209175), (2.124272654, 0))
        make_face()
    extrude(amount=3.175)
    with BuildSketch(Plane(origin=(0, 33.199630725, -30.458766724), x_dir=(0, -0.5451894510403108, -0.838312866699757), z_dir=(1, 0, 0))) as fillet4_piece_2:
        with BuildLine():
            CenterArc((2.54, 2.399867047), FILLET4_R, 180, 70.879109992)
            Line((0, 2.399867047), (-0.0508, 2.399867047))
            Line((-0.0508, 2.399867047), (-0.0508, 0))
            Line((-0.0508, 0), (0, -0.0508))
            ThreePointArc((0, -0.0508), (0.853995746, -0.0508), (1.691351321, -0.047997341))
            Line((1.691351321, -0.047997341), (1.707991491, 0))
        make_face()
    extrude(amount=3.175)
    with BuildSketch(Plane(origin=(0, -1.542001958, -41.468733267), x_dir=(0, 0.466230647669412, -0.8846632032439015), z_dir=(1, 0, 0))) as fillet4_piece_3:
        with BuildLine():
            CenterArc((2.503946527, -2.514474671), FILLET4_R, 98.12963068, 81.042861753)
            Line((-0.035788565, -2.477791408), (-0.289762074, -2.474123082))
            Line((-0.289762074, -2.474123082), (-0.253973509, 0.003668326))
            Line((-0.253973509, 0.003668326), (0.003668326, 0.253973509))
            ThreePointArc((0.003668326, 0.253973509), (1.752552501, 0.228713088), (2.108838028, 0.251447467))
            Line((2.108838028, 0.251447467), (2.144756982, 0))
        make_face()
    extrude(amount=3.175)
    with BuildSketch(Plane(origin=(0, -4.421126968, -35.808950658), x_dir=(0, -0.4534055133611399, 0.8913043478261066), z_dir=(1, 0, 0))) as fillet4_piece_4:
        with BuildLine():
            CenterArc((2.54, 2.413715879), FILLET4_R, 180, 71.856915027)
            Line((0, 2.413715879), (-0.0508, 2.413715879))
            Line((-0.0508, 2.413715879), (-0.0508, 0))
            Line((-0.0508, 0), (0, -0.0508))
            ThreePointArc((0, -0.0508), (0.874533296, -0.0508), (1.733247924, -0.048274318))
            Line((1.733247924, -0.048274318), (1.749066592, 0))
        make_face()
    extrude(amount=3.175)
    with BuildSketch(Plane(origin=(0, 9.542602255, -0.77644766), x_dir=(0, 0.9967060969511591, -0.08109843586892752), z_dir=(1, 0, 0))) as fillet4_piece_5:
        with BuildLine():
            CenterArc((2.54, 2.326587881), FILLET4_R, 180, 66.345211462)
            Line((0, 2.326587881), (-0.0508, 2.326587881))
            Line((-0.0508, 2.326587881), (-0.0508, 0))
            Line((-0.0508, 0), (0, -0.0508))
            ThreePointArc((0, -0.0508), (0.760444107, -0.0508), (1.500505979, -0.046531758))
            Line((1.500505979, -0.046531758), (1.520888214, 0))
        make_face()
    extrude(amount=3.175)
    with BuildSketch(Plane(origin=(0, 3.213518539, -0.261472593), x_dir=(0, -0.9984457063976324, 0.05573303666706552), z_dir=(1, 0, 0))) as fillet4_piece_6:
        with BuildLine():
            CenterArc((2.477230301, -2.500513603), FILLET4_R, 100.115998519, 78.42721807)
            Line((-0.061948733, -2.435939367), (-0.315866636, -2.429481943))
            Line((-0.315866636, -2.429481943), (-0.253917903, 0.006457424))
            Line((-0.253917903, 0.006457424), (0.006457424, 0.253917903))
            ThreePointArc((0.006457424, 0.253917903), (1.526854064, 0.215252472), (1.986487618, 0.25005136))
            Line((1.986487618, 0.25005136), (2.031100589, 0))
        make_face()
    extrude(amount=3.175)

    # Sketch20 → Cut-Extrude12 (cut, through all)
    with BuildSketch(Plane.ZY):
        with Locations((-22.951765291, 12.872202834)):
            Circle(SKETCH20_R)
    extrude(amount=-CUT_EXTRUDE12_DEPTH, mode=Mode.SUBTRACT)


solid = part.part
